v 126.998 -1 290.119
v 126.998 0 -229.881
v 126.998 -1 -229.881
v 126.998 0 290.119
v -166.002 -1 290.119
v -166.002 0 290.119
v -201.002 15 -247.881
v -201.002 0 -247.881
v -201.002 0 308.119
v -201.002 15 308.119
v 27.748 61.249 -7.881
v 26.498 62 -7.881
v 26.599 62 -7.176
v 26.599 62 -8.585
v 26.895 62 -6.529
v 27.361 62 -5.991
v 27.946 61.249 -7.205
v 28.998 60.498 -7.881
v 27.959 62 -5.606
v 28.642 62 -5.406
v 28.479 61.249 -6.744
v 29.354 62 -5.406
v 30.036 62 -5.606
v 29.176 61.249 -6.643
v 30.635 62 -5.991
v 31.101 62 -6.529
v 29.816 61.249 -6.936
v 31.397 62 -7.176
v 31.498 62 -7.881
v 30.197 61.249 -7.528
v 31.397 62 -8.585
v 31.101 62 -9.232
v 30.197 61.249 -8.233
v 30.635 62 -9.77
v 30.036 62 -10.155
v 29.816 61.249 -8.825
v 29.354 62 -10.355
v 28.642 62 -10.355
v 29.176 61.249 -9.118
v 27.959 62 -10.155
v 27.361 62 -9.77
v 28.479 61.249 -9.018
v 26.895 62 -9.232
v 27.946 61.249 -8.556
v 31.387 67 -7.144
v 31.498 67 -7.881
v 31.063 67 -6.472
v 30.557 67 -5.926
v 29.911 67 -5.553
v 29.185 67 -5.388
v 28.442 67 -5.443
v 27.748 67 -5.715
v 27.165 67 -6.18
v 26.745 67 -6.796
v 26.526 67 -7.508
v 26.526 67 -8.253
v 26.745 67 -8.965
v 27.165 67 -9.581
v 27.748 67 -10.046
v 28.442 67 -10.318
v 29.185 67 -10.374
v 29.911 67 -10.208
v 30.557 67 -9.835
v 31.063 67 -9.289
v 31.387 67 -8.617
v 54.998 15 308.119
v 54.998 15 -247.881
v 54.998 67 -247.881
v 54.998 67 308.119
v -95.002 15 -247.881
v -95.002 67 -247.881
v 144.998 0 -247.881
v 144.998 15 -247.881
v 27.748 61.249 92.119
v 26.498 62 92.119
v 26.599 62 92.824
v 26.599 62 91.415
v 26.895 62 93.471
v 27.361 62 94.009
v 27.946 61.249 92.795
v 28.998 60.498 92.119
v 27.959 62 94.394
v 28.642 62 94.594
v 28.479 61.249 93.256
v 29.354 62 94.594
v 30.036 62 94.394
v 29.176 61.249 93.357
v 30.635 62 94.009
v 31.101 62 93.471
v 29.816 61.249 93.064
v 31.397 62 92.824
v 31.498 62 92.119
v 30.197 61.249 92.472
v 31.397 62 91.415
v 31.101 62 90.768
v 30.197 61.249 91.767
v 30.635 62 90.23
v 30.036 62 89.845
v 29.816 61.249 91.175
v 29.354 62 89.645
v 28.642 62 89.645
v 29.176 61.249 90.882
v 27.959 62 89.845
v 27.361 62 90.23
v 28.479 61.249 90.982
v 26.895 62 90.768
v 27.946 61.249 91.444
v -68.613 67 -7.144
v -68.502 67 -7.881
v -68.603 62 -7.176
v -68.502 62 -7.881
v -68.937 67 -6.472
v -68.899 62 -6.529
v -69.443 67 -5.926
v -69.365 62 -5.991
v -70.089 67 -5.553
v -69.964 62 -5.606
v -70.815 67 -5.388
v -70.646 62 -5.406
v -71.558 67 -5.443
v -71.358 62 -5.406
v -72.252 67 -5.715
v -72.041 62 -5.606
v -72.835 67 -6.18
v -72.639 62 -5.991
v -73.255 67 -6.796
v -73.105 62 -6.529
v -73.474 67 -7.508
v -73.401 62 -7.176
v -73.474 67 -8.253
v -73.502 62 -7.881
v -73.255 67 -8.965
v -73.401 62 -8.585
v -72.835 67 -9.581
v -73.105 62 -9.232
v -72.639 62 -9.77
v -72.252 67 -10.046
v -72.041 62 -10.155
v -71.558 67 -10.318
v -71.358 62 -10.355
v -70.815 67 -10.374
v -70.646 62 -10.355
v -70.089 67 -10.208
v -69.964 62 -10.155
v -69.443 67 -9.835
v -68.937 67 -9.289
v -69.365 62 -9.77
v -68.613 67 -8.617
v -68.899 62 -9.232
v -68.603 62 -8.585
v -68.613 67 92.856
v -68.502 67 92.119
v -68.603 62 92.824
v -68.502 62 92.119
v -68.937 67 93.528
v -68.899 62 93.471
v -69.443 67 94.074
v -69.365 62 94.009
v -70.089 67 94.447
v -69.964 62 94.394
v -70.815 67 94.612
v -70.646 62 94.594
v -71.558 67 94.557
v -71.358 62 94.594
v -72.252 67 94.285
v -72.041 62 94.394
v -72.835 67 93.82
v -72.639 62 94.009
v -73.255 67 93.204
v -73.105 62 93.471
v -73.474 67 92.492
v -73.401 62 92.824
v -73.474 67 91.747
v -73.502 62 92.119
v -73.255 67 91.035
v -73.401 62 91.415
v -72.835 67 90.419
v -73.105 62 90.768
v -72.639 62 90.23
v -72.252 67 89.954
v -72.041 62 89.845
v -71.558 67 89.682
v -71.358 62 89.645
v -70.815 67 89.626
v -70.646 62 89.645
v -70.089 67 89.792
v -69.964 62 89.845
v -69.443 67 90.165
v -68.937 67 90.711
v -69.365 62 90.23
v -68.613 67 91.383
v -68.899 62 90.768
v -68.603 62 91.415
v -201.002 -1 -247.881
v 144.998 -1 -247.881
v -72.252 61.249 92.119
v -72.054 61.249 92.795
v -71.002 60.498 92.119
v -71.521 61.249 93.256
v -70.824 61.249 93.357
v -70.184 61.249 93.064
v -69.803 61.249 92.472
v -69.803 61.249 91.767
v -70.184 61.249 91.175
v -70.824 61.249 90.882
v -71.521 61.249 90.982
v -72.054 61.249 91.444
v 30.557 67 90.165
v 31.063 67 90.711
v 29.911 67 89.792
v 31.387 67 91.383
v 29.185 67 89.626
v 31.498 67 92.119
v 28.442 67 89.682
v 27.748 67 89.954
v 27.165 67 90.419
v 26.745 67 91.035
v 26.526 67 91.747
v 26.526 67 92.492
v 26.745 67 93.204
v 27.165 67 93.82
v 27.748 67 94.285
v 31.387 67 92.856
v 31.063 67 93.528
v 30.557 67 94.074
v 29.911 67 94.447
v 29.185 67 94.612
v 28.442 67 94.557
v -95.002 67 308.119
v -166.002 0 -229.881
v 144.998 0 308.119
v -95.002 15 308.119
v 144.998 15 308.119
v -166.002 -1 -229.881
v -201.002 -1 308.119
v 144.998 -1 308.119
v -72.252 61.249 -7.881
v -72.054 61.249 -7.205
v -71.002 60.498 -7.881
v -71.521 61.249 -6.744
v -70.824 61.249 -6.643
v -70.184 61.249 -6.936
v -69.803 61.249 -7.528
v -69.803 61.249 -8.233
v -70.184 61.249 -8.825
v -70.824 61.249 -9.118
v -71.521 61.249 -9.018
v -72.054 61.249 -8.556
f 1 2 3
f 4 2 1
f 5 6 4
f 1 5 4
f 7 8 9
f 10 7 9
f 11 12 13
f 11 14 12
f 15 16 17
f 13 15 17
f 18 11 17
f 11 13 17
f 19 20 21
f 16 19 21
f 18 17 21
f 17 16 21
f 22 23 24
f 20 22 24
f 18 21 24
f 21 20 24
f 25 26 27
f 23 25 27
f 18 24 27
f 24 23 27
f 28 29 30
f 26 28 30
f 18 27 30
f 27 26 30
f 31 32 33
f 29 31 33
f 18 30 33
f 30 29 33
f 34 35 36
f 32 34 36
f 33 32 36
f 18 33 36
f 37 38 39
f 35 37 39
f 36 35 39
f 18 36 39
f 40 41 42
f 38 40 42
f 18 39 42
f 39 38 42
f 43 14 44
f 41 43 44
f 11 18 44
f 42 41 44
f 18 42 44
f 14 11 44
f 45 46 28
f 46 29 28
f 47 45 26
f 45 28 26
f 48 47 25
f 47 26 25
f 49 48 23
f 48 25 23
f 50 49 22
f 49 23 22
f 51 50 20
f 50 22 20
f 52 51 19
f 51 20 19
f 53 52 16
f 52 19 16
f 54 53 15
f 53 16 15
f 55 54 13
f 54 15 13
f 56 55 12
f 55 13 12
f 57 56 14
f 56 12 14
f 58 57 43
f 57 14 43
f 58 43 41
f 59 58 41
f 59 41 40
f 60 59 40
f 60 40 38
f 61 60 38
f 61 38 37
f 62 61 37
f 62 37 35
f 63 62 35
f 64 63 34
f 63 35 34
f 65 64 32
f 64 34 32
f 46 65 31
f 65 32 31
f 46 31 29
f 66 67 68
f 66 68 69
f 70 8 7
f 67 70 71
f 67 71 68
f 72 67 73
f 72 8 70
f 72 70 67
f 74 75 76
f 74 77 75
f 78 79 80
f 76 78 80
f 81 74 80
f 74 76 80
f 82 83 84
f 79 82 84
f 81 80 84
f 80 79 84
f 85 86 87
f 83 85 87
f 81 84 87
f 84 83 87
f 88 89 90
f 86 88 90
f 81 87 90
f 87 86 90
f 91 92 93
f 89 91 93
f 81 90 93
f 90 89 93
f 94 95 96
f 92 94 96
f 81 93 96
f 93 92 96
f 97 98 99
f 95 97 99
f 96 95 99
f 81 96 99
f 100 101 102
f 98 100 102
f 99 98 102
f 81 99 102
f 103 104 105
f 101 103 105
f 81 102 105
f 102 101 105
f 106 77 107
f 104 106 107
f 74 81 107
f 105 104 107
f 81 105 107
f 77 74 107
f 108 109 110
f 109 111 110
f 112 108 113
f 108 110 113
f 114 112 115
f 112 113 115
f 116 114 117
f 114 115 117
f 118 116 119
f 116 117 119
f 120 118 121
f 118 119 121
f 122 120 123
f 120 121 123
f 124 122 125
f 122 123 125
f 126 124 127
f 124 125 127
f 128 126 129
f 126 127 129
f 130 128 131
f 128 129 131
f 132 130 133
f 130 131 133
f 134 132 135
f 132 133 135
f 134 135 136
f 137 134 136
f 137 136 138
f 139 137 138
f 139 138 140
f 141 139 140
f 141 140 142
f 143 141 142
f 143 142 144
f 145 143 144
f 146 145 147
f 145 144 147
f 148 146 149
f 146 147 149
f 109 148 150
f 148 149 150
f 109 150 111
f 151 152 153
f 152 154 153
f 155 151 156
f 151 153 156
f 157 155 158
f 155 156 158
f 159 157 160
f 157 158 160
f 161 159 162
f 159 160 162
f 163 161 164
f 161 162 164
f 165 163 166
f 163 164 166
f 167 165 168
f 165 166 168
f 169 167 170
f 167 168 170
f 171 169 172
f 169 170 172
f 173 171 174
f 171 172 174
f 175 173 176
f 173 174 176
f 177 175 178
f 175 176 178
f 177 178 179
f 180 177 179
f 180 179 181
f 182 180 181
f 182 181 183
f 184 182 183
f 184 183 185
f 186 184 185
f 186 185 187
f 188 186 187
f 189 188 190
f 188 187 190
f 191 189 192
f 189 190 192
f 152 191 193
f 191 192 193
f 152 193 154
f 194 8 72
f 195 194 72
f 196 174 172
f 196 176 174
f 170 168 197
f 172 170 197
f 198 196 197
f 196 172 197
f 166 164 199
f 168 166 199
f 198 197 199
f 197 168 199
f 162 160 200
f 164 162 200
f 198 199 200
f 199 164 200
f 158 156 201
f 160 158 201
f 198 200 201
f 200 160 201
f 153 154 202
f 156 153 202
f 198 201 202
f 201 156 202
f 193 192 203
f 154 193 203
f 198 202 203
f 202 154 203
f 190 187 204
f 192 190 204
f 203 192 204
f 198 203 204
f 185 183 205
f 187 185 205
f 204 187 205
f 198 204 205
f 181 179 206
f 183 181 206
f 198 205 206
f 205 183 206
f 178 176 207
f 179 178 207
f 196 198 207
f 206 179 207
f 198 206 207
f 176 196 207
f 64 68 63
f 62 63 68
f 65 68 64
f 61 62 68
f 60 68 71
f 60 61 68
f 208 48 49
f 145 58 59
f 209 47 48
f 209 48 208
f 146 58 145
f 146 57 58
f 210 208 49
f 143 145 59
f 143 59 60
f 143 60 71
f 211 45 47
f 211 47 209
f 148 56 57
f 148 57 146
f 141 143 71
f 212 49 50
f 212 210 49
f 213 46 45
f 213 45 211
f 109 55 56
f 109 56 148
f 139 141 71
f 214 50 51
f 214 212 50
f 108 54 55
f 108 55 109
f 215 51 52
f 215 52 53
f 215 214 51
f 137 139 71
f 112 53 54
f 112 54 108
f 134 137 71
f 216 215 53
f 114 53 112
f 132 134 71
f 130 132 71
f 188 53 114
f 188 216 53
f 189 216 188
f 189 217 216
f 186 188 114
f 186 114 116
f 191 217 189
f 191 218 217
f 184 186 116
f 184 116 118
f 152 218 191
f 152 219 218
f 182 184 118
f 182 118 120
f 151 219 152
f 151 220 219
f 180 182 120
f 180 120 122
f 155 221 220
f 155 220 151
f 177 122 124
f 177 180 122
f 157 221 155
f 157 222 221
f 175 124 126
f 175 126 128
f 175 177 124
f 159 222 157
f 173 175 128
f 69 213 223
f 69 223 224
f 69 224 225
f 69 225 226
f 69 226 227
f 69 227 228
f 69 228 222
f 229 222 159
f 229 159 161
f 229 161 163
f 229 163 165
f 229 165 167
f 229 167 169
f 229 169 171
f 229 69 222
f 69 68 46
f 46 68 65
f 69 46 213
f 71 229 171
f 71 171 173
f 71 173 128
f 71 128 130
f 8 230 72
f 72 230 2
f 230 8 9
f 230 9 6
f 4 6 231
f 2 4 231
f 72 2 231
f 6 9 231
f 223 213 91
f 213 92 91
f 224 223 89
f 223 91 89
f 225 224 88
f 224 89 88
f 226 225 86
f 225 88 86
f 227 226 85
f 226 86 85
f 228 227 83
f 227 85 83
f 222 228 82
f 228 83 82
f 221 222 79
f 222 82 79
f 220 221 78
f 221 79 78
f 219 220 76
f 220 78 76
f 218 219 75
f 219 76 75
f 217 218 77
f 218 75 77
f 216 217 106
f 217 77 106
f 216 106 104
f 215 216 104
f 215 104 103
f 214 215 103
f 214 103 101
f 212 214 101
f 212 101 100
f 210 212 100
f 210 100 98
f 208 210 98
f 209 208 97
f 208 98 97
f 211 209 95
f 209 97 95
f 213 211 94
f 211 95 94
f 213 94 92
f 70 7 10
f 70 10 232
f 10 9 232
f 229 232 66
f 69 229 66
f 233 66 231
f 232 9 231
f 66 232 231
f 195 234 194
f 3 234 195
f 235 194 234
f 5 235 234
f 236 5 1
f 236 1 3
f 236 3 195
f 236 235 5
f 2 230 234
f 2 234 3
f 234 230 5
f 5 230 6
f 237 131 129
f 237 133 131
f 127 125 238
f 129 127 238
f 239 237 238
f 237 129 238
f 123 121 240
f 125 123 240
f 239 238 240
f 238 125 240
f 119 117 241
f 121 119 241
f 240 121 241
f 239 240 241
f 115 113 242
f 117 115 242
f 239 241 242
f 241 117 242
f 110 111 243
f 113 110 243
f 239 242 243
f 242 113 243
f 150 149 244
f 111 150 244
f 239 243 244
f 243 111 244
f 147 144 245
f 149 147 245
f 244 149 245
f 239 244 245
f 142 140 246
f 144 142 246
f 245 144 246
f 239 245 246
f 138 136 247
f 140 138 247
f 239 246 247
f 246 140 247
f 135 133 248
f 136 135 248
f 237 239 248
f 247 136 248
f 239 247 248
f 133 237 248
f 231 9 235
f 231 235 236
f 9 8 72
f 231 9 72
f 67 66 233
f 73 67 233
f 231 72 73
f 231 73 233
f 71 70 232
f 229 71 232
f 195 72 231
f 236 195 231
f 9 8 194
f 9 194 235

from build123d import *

# Parameters (mm, degrees)
F2_W     = 346
F2_H     = 556
F3_DEPTH = 15
F4_W     = 150
F4_H     = 556
F5_DEPTH = 52
F7_D     = 5
F7_DEPTH = 5
F7_TIP   = 1.5021515476
F8_W     = 346
F8_H     = 556
F8_W_2   = 293
F8_H_2   = 520
F9_DEPTH = 1


with BuildPart() as f3:
    # F2 (on Front) → F3 (new body)
    with BuildSketch(Plane.XZ):
        with Locations((-28.0021212956, 30.1194461733)):
            Rectangle(F2_W, F2_H)
    extrude(amount=-F3_DEPTH)

    # F4 (on face) → F5 (join)
    with BuildSketch(Plane(origin=(0, 15, 0), x_dir=(-1, 0, 0), z_dir=(0, 1, 0))):
        with Locations((20.0021212956, 30.1194461733)):
            Rectangle(F4_W, F4_H)
    extrude(amount=F5_DEPTH)

    # F7
    with Locations(Plane(origin=(0, 67, 0), x_dir=(-1, 0, 0), z_dir=(0, 1, 0))):
        with Locations((-28.9978787044, 92.1194461733), (71.0021212956, 92.1194461733), (71.0021212956, -7.8805538267), (-28.9978787044, -7.8805538267)):
            Hole(F7_D / 2, depth=F7_DEPTH)
            with Locations((0, 0, -(F7_DEPTH + F7_TIP / 2))):  # 118° drill point
                Cone(0, F7_D / 2, F7_TIP, mode=Mode.SUBTRACT)


with BuildPart() as f9:
    # F8 (on face) → F9 (new body)
    with BuildSketch(Plane.XZ):
        with Locations((-28.0021212956, 30.1194461733)):
            Rectangle(F8_W, F8_H)
        with Locations((-19.5021212956, 30.1194461733)):
            Rectangle(F8_W_2, F8_H_2, mode=Mode.SUBTRACT)
    extrude(amount=F9_DEPTH)


solid = Compound([f3.part, f9.part])
